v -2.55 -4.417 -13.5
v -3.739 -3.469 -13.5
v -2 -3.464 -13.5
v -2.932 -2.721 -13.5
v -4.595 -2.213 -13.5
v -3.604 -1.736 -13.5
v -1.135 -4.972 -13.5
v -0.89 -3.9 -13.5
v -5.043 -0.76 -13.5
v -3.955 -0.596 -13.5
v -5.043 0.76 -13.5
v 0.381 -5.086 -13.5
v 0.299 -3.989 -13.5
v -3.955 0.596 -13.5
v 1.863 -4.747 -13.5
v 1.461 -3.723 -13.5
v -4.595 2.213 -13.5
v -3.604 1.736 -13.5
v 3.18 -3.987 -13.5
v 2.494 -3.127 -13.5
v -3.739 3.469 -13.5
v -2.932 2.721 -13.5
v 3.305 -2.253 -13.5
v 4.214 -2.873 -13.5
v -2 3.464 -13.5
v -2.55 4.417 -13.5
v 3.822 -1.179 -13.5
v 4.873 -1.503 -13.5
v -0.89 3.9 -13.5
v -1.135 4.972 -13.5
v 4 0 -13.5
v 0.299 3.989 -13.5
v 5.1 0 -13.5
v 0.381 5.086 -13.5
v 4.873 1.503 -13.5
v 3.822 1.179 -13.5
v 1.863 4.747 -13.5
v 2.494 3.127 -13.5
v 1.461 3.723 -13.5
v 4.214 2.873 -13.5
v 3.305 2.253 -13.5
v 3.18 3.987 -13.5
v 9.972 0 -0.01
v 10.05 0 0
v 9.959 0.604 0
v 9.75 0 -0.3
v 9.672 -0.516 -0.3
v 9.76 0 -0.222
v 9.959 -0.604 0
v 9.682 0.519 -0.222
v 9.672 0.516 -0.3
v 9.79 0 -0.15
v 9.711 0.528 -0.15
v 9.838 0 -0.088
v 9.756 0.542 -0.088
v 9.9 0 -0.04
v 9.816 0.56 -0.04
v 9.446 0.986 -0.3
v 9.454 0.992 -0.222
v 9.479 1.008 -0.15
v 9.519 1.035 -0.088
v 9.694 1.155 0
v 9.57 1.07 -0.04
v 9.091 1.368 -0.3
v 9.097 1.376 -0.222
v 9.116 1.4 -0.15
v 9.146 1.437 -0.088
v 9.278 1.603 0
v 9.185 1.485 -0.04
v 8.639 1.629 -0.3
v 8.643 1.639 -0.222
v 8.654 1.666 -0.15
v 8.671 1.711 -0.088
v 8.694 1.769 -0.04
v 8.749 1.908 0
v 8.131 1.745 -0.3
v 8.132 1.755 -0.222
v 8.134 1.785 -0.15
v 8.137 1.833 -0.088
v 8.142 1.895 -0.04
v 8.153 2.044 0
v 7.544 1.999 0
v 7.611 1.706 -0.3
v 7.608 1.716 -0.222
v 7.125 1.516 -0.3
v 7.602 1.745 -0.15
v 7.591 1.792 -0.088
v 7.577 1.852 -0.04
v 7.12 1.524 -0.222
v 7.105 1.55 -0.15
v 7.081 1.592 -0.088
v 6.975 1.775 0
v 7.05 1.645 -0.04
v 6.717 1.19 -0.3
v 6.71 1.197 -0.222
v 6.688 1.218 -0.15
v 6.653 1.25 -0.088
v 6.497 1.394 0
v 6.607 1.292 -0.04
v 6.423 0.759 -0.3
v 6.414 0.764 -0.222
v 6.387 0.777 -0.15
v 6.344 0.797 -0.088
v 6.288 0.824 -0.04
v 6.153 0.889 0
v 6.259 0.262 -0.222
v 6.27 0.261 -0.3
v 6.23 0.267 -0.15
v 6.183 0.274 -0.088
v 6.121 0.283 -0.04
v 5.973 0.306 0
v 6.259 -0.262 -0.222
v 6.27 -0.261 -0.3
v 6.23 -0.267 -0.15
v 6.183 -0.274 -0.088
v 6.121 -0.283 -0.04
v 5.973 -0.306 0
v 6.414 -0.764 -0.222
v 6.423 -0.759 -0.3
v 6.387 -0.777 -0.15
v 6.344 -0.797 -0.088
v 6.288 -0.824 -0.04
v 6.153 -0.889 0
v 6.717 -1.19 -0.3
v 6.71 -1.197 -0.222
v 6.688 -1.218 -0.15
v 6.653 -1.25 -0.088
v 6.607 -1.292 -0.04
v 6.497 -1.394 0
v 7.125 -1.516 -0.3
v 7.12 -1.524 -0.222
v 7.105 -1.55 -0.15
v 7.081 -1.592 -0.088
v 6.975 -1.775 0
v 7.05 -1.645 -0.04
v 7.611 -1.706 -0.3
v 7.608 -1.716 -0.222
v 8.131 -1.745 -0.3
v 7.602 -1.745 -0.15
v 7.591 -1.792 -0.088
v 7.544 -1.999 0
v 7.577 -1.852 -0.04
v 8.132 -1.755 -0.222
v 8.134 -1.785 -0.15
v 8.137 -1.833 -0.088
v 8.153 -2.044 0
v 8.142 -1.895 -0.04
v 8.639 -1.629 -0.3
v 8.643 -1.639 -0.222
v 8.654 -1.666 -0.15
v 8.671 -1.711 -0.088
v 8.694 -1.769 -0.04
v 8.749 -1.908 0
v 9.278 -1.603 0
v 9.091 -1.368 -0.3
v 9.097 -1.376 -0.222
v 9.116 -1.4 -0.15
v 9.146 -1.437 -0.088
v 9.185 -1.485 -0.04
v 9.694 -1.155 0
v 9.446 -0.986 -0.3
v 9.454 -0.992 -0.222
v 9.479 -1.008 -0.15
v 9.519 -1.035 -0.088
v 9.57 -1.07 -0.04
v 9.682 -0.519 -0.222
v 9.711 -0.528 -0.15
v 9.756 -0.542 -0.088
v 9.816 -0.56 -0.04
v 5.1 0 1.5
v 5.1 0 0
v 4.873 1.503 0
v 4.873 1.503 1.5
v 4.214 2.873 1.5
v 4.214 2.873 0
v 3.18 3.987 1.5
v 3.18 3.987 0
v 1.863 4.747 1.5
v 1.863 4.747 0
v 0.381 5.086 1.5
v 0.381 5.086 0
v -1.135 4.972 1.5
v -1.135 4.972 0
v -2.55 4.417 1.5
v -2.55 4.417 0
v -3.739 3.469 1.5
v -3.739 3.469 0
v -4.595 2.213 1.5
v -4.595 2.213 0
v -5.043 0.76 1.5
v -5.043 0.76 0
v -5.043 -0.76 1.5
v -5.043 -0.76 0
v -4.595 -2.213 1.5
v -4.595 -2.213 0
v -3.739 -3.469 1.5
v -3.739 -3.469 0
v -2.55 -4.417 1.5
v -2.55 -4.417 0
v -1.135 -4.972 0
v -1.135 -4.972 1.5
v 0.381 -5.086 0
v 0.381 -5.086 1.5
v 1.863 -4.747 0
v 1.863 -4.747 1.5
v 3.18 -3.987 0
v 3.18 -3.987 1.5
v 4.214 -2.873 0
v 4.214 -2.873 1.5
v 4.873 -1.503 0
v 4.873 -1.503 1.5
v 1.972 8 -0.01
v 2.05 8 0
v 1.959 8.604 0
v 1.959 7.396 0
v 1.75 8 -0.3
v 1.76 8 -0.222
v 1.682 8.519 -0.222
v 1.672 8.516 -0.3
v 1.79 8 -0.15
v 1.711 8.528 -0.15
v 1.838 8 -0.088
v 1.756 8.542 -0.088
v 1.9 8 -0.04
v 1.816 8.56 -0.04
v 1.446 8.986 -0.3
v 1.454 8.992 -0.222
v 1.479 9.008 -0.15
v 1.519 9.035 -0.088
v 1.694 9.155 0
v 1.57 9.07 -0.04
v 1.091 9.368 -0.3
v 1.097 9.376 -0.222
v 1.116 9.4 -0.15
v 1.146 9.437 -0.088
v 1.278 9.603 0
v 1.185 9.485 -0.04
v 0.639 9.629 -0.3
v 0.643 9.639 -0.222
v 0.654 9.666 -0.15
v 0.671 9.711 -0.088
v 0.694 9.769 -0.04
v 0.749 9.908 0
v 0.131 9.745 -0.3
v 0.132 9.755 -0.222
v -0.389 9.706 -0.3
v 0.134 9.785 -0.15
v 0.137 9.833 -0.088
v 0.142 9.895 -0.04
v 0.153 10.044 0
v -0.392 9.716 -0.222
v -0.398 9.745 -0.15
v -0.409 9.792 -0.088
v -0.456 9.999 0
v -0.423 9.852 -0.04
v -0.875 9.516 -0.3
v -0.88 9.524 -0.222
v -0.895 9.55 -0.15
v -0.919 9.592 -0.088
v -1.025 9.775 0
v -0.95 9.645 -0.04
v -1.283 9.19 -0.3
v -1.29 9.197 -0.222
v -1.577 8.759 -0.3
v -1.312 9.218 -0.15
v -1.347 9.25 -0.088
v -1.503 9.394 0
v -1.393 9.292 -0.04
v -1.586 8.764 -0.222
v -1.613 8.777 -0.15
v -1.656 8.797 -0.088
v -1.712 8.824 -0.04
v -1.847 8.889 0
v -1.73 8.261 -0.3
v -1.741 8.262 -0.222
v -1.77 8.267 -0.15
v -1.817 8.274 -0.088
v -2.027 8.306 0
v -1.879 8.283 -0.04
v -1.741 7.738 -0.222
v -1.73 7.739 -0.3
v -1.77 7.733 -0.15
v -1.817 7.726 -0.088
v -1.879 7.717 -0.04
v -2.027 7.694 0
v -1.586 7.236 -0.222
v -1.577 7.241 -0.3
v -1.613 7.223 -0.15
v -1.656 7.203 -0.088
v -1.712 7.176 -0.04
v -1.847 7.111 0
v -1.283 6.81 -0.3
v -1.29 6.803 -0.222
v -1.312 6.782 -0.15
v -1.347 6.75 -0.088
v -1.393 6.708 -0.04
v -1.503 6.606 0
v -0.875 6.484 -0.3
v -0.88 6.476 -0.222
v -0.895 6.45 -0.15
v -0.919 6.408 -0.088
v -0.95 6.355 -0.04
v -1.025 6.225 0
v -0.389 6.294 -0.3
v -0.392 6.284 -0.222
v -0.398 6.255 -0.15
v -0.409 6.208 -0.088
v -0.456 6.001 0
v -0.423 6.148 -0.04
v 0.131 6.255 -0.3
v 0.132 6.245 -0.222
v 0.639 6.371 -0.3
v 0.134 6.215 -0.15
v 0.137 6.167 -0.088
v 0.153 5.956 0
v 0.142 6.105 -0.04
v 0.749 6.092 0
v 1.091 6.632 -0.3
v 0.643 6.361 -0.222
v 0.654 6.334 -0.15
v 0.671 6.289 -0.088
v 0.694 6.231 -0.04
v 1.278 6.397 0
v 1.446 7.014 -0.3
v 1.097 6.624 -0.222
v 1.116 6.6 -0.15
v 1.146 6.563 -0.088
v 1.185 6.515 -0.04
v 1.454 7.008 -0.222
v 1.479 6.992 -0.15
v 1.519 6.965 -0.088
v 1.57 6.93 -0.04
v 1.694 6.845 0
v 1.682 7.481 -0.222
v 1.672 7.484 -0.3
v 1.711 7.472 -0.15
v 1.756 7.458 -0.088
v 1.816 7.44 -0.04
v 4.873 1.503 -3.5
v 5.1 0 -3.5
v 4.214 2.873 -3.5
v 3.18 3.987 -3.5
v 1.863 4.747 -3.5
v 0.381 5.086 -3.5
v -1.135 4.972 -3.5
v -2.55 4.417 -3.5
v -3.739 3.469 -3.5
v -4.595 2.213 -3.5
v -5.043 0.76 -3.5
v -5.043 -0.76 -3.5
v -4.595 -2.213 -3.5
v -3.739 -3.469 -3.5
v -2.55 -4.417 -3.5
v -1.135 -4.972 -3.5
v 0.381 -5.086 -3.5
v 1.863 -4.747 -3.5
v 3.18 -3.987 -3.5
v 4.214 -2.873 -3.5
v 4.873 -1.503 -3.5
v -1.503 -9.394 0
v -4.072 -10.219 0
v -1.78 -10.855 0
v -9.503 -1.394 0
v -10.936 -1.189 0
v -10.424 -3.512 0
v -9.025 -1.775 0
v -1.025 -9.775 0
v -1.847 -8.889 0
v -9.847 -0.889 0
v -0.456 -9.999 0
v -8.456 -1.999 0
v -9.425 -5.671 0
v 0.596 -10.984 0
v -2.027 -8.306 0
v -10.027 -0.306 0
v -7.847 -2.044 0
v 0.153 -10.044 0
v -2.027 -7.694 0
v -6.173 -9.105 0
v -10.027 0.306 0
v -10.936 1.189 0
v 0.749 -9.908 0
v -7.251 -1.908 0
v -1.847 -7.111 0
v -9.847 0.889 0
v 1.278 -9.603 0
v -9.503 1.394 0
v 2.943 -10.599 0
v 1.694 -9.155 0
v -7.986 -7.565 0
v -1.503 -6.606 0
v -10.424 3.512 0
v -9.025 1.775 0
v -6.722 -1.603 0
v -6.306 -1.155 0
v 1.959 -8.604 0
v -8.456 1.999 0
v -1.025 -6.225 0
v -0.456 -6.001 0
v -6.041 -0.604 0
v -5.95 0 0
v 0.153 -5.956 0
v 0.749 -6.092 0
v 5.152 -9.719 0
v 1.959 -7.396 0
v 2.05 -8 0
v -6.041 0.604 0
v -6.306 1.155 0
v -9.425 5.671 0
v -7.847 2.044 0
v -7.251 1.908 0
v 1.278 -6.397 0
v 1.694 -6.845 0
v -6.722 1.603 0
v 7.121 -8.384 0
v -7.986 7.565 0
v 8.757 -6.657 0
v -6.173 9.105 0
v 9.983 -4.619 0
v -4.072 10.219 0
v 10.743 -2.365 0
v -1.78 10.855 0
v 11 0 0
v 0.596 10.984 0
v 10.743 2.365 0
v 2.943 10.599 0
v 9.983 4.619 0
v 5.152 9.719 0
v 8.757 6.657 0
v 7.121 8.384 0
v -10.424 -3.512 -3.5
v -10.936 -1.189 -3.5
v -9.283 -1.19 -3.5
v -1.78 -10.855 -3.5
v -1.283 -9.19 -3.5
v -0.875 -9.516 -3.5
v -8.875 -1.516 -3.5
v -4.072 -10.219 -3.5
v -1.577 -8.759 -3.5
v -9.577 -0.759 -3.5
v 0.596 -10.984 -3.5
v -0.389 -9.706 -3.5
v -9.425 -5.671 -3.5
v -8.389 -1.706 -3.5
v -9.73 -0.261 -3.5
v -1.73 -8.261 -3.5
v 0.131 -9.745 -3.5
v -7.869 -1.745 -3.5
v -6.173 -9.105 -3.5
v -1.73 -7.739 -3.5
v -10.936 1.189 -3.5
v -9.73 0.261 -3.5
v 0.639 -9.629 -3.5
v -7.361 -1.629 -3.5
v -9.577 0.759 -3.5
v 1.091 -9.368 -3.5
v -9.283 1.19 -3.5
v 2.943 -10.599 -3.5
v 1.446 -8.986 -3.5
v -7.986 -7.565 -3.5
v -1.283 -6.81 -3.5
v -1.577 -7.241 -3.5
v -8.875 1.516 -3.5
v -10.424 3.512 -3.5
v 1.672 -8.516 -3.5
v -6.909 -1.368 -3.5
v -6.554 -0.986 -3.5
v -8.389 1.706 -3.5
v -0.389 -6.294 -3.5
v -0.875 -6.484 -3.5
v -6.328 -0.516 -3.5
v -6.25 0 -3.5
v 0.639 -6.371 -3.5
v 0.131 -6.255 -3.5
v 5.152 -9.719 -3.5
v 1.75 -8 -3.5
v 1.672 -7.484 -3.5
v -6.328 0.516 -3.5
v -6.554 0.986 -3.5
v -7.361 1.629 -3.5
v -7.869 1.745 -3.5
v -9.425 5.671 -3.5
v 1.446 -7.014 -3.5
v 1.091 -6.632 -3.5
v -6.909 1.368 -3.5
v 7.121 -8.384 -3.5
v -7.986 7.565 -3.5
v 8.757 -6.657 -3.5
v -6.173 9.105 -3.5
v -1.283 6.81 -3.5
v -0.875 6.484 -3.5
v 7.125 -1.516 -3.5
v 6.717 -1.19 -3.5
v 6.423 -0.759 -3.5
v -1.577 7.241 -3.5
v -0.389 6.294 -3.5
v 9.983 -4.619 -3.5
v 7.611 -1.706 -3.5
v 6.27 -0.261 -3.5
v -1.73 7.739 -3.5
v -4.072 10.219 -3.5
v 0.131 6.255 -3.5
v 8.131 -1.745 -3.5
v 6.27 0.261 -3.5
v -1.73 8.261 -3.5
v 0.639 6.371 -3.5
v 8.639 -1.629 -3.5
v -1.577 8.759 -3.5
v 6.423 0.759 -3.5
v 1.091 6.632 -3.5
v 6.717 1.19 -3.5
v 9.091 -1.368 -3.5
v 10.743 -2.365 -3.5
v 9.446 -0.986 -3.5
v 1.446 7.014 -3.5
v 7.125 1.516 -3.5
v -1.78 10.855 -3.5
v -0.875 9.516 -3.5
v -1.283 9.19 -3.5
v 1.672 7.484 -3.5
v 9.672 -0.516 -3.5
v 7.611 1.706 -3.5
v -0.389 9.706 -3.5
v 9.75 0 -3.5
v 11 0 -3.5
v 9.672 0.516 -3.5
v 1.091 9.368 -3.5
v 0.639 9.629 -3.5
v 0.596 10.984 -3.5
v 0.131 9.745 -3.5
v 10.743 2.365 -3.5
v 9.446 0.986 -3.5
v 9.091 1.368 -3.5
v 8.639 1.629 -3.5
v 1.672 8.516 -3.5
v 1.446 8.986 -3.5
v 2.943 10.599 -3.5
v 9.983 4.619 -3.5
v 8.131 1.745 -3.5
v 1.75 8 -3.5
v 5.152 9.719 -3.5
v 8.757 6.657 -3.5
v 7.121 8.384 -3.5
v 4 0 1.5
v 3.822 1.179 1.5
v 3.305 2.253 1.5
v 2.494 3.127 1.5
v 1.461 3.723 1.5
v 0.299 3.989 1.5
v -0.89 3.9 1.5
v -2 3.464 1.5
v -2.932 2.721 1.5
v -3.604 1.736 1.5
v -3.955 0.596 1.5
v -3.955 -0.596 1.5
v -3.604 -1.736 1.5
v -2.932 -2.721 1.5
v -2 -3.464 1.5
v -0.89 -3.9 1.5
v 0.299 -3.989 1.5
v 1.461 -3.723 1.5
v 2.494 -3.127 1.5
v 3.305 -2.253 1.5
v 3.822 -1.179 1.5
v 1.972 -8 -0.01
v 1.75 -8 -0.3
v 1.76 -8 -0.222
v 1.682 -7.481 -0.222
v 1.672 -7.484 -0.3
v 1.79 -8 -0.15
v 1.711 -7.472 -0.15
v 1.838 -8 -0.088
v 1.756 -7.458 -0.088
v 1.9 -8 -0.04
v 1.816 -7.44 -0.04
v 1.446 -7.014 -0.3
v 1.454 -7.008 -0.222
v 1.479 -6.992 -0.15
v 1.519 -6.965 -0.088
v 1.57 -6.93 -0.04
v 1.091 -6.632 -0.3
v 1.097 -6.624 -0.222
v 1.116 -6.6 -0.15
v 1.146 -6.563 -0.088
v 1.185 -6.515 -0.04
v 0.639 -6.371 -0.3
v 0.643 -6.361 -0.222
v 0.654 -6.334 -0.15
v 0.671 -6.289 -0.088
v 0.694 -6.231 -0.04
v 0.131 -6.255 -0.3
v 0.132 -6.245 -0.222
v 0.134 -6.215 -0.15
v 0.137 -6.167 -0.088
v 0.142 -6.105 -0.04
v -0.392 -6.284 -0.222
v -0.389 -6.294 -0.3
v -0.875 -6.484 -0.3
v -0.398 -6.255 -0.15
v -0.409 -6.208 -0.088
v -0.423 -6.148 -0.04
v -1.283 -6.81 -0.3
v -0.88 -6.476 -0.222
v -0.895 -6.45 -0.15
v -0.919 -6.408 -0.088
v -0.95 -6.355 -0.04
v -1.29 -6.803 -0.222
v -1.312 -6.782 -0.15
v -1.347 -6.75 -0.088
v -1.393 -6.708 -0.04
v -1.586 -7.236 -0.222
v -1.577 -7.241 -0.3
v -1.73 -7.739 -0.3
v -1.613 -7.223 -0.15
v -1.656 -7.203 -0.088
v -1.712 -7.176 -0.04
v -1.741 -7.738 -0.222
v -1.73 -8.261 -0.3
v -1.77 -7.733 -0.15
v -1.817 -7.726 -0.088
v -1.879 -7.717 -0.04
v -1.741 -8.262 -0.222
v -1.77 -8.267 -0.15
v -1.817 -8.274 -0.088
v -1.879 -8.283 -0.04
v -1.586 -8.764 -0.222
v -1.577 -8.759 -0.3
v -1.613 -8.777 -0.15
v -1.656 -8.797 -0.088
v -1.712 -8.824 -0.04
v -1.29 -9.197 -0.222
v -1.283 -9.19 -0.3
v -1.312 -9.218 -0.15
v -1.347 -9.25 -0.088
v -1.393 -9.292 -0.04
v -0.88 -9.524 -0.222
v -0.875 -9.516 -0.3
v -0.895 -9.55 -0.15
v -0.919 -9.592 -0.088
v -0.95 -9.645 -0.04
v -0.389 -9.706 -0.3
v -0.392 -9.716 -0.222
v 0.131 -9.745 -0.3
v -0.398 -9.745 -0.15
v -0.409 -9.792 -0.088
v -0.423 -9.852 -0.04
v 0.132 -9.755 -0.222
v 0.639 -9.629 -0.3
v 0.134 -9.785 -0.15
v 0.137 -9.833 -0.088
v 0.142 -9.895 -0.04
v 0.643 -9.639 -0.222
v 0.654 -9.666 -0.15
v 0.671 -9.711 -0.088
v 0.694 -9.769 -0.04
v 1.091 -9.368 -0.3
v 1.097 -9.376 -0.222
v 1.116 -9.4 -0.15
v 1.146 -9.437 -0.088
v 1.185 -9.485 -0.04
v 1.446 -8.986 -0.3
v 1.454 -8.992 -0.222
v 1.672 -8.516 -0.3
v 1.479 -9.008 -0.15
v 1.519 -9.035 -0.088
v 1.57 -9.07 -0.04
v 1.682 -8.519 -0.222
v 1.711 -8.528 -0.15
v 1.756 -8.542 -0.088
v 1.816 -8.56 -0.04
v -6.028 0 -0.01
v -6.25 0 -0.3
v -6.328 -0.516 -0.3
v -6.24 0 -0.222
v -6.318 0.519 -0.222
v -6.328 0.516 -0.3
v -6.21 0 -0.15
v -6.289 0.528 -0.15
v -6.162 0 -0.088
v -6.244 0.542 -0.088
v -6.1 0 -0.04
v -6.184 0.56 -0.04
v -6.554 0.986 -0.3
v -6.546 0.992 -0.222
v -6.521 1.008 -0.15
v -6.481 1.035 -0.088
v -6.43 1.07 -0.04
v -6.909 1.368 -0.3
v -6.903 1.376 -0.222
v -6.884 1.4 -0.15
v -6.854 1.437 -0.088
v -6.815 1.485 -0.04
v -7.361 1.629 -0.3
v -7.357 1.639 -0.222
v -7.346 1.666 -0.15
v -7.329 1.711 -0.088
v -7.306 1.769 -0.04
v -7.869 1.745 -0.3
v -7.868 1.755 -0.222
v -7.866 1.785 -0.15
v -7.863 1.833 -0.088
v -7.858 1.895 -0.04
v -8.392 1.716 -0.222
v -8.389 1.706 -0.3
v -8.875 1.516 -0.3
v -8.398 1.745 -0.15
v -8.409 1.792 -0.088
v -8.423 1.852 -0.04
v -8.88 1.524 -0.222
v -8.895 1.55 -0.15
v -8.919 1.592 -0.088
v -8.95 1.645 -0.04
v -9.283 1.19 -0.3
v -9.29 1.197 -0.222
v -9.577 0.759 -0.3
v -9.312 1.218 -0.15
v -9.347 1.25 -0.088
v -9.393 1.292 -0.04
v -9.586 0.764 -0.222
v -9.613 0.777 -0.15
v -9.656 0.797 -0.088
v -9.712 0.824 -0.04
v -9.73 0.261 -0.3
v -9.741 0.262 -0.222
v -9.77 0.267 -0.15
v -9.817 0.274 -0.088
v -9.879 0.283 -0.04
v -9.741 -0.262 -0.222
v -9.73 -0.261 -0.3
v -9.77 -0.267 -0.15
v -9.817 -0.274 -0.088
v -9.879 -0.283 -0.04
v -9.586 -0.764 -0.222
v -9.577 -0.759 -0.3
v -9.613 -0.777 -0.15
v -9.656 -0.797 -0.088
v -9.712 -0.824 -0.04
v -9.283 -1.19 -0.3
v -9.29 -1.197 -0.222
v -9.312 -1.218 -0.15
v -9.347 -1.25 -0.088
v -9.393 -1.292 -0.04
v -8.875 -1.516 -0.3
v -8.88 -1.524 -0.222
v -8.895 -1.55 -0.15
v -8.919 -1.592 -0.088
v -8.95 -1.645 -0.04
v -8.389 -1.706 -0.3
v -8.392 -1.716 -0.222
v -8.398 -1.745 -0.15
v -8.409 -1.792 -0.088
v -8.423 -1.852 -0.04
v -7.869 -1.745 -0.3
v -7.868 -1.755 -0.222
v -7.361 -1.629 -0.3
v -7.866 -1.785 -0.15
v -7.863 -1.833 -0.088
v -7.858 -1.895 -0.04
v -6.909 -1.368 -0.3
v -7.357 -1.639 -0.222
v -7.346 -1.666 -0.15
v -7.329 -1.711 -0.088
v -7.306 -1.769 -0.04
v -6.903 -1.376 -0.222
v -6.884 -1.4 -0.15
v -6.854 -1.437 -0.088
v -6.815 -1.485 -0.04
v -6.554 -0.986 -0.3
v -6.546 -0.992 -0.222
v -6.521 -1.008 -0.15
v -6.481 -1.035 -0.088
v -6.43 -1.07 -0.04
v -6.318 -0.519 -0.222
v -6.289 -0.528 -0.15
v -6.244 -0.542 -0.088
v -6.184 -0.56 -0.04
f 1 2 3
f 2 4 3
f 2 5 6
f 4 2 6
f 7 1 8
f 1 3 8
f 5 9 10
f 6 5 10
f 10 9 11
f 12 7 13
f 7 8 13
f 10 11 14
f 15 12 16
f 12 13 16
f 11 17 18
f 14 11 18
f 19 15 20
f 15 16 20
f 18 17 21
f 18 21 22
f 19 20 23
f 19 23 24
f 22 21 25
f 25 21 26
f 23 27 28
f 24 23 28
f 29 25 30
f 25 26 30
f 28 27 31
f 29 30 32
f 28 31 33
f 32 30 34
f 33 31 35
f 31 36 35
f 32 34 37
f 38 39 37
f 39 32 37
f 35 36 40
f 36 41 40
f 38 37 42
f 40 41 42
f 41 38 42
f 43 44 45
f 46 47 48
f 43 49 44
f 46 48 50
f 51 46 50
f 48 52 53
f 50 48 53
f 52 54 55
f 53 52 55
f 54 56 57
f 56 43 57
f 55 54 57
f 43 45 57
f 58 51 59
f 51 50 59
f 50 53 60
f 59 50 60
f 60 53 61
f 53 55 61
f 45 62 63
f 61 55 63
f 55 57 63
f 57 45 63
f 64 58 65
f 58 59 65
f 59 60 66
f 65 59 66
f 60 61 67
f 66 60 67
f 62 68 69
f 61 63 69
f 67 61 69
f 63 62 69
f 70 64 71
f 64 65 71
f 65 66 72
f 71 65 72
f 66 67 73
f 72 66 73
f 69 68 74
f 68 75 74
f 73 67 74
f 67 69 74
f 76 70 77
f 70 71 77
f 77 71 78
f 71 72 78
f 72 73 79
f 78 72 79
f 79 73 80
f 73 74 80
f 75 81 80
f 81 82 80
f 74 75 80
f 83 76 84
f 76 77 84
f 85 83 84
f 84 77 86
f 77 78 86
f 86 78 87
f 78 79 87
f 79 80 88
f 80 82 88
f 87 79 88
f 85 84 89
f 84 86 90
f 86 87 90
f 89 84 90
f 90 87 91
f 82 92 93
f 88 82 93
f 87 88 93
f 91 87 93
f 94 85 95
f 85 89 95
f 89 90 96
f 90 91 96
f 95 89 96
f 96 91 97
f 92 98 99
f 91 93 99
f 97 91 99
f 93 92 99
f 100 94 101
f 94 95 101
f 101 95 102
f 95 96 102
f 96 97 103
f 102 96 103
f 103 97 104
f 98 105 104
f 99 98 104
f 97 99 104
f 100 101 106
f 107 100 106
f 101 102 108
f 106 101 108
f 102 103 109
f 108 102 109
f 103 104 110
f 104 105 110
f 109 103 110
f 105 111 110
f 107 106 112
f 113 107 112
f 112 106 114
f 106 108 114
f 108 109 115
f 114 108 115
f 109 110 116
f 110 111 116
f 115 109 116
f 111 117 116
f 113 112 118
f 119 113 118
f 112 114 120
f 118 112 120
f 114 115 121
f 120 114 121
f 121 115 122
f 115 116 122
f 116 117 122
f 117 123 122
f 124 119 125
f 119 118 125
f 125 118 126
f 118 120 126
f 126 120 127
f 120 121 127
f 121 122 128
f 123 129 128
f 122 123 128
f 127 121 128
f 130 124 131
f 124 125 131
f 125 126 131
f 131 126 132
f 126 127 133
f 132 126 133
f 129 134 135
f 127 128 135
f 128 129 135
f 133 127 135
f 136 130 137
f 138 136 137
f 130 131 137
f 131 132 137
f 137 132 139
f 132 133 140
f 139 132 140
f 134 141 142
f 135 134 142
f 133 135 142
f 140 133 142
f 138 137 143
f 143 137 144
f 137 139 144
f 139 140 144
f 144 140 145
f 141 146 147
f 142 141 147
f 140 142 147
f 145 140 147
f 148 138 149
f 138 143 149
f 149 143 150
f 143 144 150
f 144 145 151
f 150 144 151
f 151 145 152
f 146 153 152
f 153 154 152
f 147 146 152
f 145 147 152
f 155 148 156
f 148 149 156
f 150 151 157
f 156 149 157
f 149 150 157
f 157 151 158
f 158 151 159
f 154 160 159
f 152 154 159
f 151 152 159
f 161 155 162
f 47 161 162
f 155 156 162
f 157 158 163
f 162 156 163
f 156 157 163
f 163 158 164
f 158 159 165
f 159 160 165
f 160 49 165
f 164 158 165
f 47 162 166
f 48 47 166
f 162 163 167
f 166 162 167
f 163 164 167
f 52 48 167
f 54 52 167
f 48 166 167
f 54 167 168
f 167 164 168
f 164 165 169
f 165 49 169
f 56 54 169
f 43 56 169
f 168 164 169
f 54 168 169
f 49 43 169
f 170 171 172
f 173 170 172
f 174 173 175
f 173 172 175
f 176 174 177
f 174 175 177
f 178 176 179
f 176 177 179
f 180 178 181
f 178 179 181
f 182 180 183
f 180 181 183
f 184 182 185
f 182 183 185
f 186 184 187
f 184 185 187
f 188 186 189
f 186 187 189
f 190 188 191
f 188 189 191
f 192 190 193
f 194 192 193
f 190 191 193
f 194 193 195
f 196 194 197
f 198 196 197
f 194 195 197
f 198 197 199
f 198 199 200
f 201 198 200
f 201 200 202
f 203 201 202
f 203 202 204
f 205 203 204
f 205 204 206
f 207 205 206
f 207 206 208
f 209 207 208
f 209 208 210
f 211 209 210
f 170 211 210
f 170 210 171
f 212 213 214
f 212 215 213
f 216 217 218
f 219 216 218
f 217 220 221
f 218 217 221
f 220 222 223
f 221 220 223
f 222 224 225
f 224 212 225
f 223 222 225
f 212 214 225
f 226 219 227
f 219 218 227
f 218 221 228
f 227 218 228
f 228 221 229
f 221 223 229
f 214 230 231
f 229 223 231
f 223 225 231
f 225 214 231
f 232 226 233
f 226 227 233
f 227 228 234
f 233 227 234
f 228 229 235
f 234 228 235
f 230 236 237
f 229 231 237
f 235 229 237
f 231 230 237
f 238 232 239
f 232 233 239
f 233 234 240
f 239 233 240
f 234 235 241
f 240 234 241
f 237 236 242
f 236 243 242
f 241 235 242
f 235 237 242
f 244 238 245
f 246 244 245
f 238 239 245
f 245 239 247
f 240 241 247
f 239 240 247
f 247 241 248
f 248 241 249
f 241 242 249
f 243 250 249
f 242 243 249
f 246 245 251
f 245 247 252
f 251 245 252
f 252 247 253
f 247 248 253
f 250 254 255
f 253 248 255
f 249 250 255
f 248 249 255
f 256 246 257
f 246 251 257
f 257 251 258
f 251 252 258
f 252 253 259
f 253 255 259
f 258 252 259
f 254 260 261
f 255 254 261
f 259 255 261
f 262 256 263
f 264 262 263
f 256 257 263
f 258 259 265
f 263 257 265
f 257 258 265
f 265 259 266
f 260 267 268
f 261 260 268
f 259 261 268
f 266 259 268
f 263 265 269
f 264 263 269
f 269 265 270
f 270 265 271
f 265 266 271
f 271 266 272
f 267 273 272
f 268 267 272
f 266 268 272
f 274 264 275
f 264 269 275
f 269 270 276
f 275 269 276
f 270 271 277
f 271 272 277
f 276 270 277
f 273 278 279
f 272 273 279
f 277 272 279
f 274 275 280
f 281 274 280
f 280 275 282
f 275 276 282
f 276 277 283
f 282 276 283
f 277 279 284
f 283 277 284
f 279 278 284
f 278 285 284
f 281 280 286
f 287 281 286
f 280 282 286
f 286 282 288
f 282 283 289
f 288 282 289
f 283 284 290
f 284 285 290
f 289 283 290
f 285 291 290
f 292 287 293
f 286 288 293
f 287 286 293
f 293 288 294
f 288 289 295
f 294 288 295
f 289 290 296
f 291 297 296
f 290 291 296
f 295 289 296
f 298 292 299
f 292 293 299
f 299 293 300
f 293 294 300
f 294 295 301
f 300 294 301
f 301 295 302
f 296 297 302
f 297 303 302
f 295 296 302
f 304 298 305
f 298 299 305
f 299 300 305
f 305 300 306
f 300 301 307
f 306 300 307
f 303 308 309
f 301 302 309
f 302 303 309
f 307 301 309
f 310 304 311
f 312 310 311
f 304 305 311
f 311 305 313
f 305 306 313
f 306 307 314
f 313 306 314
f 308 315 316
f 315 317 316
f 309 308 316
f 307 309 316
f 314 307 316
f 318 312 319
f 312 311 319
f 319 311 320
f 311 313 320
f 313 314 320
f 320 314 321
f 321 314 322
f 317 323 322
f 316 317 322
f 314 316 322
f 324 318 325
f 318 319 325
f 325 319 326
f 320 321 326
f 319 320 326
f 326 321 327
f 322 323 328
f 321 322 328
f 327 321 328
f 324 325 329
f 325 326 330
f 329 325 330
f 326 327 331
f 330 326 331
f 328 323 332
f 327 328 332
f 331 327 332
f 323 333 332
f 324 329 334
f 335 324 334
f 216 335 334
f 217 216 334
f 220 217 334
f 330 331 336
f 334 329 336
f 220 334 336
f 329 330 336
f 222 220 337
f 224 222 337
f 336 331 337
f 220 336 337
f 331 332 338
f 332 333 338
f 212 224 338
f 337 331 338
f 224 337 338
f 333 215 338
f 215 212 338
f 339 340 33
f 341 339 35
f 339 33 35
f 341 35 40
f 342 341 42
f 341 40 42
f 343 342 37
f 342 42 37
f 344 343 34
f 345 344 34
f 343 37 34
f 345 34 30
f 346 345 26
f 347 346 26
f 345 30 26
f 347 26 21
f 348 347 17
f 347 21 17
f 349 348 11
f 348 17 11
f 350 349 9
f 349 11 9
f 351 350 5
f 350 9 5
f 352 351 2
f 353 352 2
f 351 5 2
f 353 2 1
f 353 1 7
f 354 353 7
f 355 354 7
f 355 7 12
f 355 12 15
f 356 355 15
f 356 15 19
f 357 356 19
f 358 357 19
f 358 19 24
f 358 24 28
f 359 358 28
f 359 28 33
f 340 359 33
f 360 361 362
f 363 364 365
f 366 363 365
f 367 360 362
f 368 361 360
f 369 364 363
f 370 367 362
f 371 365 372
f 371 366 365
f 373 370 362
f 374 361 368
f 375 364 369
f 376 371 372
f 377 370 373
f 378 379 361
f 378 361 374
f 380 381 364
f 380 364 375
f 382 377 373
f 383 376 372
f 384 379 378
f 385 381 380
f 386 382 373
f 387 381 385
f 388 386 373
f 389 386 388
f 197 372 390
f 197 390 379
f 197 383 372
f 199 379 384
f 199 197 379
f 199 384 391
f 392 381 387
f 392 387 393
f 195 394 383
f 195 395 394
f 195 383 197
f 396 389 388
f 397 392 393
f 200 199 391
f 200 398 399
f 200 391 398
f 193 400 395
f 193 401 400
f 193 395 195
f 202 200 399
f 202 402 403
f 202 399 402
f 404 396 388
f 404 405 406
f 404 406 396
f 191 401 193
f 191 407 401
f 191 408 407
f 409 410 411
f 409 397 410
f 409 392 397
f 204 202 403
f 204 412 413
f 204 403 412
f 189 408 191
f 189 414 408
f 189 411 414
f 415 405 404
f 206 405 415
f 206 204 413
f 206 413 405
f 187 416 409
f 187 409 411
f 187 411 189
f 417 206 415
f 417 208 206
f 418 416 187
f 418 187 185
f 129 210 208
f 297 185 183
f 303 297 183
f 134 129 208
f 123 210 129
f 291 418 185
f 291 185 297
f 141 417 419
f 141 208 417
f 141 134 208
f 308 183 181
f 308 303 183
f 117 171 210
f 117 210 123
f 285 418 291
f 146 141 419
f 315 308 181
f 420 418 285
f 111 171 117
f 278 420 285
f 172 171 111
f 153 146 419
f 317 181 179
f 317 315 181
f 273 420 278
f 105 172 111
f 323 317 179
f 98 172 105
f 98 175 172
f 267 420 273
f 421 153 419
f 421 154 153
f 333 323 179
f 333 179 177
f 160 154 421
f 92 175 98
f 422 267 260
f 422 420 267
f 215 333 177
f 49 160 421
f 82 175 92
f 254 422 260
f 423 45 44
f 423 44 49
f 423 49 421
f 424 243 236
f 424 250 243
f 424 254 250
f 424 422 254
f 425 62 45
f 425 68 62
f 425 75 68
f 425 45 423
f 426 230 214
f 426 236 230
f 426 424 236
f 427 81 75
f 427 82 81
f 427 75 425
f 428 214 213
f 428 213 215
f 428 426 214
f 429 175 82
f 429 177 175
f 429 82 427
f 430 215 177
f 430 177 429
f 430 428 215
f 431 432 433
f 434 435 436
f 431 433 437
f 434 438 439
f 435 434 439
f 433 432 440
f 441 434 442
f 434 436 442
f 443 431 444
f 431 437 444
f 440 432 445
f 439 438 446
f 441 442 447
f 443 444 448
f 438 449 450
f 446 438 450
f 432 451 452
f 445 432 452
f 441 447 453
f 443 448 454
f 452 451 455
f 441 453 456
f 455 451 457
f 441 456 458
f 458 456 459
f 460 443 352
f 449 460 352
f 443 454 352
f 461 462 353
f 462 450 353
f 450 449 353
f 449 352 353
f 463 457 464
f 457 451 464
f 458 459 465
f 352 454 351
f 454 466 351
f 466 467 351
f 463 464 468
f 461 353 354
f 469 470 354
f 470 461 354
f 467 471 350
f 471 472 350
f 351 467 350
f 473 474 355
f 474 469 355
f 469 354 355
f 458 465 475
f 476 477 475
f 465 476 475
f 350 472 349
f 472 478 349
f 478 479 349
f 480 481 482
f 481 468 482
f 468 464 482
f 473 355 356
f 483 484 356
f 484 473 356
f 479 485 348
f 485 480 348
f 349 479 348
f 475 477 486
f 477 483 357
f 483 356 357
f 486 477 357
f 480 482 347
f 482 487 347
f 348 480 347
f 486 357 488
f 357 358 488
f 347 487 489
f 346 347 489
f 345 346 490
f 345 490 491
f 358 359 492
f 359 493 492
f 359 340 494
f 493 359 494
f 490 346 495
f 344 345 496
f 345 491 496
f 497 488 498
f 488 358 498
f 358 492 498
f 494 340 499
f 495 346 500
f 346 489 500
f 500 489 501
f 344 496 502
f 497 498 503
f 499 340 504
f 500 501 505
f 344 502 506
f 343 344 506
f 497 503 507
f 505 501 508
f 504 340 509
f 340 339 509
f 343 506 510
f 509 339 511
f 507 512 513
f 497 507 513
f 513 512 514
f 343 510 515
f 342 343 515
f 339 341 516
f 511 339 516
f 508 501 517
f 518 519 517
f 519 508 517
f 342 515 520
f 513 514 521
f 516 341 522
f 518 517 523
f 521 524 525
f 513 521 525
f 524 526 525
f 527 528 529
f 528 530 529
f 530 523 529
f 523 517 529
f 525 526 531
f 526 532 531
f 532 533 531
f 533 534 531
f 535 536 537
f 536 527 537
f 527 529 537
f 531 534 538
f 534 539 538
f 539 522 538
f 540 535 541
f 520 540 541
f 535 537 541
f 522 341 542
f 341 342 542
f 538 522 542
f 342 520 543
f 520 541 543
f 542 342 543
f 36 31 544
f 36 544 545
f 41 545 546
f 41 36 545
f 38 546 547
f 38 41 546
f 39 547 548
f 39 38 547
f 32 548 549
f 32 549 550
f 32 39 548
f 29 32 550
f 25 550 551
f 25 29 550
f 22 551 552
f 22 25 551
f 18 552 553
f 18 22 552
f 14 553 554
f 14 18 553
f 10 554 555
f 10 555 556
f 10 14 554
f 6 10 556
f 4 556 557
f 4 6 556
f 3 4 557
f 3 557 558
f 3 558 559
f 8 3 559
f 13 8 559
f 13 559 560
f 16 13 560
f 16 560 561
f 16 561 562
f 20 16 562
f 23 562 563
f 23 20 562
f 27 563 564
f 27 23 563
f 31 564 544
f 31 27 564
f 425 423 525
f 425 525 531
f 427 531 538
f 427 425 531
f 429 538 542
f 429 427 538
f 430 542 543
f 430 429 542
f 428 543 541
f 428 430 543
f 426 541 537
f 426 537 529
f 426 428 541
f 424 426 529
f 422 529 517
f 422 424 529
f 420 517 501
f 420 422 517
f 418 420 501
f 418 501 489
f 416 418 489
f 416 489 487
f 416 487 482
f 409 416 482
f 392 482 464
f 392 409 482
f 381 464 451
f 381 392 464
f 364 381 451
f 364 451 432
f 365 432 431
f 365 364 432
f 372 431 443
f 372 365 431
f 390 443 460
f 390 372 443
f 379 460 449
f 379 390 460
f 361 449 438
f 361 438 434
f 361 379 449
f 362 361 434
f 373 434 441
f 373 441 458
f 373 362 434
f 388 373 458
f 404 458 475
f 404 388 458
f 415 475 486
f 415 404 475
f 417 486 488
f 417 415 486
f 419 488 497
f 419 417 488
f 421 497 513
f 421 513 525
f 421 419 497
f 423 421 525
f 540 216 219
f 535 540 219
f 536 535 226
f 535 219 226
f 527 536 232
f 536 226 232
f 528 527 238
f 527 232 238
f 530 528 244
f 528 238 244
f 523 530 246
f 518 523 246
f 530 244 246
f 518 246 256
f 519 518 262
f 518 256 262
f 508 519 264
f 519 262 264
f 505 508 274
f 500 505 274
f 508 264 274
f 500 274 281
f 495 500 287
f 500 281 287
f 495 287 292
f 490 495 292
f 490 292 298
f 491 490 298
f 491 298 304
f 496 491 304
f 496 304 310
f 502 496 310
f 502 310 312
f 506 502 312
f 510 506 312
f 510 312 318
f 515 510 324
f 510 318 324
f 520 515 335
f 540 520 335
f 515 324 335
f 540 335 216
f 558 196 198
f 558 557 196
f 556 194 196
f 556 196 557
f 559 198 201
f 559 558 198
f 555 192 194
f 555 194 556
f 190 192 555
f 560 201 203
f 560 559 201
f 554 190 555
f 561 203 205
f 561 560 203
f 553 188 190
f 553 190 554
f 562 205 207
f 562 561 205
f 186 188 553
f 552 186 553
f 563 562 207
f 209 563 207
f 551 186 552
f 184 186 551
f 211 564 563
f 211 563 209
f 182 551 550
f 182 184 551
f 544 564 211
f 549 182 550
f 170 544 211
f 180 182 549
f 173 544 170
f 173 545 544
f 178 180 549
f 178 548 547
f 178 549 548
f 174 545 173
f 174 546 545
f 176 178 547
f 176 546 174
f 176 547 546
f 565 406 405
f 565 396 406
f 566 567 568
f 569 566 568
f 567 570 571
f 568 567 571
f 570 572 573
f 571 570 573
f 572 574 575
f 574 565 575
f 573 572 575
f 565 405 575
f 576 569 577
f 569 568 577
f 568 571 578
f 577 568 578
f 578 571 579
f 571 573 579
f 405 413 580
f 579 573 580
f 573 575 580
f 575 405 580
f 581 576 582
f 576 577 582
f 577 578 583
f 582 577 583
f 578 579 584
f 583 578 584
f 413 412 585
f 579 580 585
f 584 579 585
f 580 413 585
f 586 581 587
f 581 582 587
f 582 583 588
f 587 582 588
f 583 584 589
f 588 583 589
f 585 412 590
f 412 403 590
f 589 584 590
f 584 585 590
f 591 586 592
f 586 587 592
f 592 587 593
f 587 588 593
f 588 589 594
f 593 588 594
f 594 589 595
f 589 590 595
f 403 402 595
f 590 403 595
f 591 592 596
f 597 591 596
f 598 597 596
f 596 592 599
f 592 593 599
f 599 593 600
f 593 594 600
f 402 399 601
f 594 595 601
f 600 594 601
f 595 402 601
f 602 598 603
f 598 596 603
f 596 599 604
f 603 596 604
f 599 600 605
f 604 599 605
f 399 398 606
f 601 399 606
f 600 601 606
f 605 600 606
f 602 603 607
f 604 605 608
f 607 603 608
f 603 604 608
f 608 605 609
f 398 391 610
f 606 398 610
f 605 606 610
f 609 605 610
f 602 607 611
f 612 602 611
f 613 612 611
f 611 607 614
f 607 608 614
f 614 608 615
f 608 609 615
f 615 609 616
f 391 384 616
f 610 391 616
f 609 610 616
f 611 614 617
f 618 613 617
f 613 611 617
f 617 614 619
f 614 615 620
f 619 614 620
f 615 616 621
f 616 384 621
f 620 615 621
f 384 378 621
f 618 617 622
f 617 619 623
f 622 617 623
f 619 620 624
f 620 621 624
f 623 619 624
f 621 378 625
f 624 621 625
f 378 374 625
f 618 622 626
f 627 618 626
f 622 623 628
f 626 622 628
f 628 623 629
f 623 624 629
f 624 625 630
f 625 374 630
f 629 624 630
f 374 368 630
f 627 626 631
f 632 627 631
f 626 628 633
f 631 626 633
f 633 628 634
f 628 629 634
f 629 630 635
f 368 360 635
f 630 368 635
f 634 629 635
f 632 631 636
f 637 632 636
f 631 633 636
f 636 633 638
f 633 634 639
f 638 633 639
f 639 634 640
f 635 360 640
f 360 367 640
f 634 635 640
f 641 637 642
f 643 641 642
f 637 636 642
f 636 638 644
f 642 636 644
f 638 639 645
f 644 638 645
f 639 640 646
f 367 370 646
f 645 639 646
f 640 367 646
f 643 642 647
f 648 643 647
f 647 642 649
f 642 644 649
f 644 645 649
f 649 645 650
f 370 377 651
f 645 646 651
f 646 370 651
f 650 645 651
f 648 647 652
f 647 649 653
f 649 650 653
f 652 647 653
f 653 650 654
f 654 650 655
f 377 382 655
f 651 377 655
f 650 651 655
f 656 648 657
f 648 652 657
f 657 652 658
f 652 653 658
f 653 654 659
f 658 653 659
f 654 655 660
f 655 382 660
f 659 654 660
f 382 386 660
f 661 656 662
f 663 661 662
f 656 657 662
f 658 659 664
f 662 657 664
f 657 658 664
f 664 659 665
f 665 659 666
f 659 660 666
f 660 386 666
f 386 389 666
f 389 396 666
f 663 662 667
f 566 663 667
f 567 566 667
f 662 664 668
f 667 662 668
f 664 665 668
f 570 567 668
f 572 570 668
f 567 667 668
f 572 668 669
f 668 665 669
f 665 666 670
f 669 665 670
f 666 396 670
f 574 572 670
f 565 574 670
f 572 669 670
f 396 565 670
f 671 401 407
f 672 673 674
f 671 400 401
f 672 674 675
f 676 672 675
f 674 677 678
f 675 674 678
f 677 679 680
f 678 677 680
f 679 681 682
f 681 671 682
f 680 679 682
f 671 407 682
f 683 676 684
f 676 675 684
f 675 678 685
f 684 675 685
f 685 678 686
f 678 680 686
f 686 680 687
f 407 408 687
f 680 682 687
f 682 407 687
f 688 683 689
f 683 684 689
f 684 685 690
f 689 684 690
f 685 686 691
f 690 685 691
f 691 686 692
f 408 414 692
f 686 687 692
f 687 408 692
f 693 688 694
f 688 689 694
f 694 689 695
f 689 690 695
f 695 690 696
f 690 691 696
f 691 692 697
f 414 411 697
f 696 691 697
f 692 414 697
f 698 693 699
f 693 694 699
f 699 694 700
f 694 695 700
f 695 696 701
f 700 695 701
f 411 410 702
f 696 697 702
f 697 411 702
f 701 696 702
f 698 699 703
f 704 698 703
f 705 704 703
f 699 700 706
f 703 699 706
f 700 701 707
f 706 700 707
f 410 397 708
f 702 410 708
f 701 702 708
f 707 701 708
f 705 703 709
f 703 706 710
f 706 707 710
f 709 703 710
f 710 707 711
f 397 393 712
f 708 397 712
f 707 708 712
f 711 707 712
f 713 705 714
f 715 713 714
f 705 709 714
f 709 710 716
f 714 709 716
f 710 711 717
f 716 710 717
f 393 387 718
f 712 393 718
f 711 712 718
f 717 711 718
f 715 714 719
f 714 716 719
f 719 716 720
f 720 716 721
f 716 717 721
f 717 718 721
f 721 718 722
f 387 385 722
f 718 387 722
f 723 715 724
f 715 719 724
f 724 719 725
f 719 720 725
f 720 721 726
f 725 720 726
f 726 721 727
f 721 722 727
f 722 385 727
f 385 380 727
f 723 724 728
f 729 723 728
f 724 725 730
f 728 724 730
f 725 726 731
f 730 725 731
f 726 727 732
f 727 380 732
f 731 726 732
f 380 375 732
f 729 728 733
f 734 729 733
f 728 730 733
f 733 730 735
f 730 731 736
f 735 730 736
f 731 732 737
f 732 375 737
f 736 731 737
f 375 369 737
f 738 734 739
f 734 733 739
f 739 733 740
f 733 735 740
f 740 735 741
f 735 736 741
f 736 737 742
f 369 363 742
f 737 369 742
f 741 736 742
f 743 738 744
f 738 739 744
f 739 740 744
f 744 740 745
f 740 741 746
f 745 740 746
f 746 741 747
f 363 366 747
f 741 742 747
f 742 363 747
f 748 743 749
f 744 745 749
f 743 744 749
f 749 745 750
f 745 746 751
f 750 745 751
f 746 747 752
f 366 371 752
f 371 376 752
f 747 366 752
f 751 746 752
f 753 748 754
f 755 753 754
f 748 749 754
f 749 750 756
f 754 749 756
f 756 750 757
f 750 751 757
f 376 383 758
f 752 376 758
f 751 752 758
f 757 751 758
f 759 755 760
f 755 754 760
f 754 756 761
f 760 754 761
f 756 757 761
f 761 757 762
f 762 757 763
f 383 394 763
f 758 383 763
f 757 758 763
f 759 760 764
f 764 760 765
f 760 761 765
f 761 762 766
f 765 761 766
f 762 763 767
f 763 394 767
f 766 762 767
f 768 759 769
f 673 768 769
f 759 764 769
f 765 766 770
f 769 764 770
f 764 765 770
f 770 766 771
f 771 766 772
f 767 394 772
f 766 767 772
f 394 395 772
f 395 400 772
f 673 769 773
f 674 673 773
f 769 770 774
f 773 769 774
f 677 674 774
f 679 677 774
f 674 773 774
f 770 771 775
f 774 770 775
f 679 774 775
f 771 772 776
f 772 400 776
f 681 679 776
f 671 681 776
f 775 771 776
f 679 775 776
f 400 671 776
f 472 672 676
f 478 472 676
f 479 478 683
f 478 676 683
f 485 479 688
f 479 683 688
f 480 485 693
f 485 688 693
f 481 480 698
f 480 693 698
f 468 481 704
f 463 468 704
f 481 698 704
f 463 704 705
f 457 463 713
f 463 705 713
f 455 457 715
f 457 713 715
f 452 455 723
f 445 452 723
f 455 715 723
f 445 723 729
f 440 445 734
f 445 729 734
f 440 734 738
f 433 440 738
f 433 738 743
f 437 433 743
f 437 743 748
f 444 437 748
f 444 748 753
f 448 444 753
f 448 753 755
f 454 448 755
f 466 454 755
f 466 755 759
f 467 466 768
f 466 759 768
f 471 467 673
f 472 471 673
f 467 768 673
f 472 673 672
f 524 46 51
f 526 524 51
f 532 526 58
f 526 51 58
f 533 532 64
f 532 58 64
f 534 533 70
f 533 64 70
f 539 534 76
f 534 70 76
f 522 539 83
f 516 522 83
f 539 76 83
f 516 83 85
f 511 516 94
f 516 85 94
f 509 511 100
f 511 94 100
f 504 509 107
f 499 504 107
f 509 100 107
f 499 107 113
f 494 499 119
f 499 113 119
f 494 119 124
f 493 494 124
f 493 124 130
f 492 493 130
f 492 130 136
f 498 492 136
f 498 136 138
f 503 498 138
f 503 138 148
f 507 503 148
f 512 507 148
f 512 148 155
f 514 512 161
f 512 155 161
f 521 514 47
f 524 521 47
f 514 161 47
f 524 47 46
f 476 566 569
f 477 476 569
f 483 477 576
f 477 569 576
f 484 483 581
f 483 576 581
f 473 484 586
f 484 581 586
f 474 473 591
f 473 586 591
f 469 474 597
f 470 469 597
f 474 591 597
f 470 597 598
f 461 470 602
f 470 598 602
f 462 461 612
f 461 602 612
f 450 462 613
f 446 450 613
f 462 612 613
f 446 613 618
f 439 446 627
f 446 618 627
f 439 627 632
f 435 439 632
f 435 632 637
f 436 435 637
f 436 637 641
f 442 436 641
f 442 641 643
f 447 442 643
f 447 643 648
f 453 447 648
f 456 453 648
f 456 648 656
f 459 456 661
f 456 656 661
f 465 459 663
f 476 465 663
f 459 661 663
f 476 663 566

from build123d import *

# Parameters (mm, degrees)
SKETCH1_R                = 11
SKETCH1_R_2              = 5.1
SKETCH1_R_3              = 1.75
BOSS_EXTRUDE1_DEPTH      = 3.5
BOSS_EXTRUDE2_DEPTH      = 1.5
BOSS_EXTRUDE2_DEPTH_BACK = 13.5
SKETCH2_R                = 5.1
SKETCH2_R_2              = 4
FILLET2_R                = 0.3


with BuildPart() as part:
    # Sketch1 → Boss-Extrude1 (new body)
    with BuildSketch(Plane.XY):
        Circle(SKETCH1_R)
        Circle(SKETCH1_R_2, mode=Mode.SUBTRACT)
        with Locations((0, 8)):
            Circle(SKETCH1_R_3, mode=Mode.SUBTRACT)
        with Locations((8, 0)):
            Circle(SKETCH1_R_3, mode=Mode.SUBTRACT)
        with Locations((0, -8)):
            Circle(SKETCH1_R_3, mode=Mode.SUBTRACT)
        with Locations((-8, 0)):
            Circle(SKETCH1_R_3, mode=Mode.SUBTRACT)
    extrude(amount=-BOSS_EXTRUDE1_DEPTH)

    # Sketch2 → Boss-Extrude2 (add, two sides: drawn at the far end of the back side and taken through both)
    with BuildSketch(Plane.XY.offset(-BOSS_EXTRUDE2_DEPTH_BACK)):
        Circle(SKETCH2_R)
        Circle(SKETCH2_R_2, mode=Mode.SUBTRACT)
    extrude(amount=BOSS_EXTRUDE2_DEPTH + BOSS_EXTRUDE2_DEPTH_BACK)

    # Fillet2
    fillet2_edges = [part.edges().sort_by_distance(p)[0] for p in [
        (6.25, 0, 0),
        (-1.75, -8, 0),
        (-9.75, 0, 0),
        (-1.75, 8, 0),
    ]]
    fillet(fillet2_edges, radius=FILLET2_R)


solid = part.part
